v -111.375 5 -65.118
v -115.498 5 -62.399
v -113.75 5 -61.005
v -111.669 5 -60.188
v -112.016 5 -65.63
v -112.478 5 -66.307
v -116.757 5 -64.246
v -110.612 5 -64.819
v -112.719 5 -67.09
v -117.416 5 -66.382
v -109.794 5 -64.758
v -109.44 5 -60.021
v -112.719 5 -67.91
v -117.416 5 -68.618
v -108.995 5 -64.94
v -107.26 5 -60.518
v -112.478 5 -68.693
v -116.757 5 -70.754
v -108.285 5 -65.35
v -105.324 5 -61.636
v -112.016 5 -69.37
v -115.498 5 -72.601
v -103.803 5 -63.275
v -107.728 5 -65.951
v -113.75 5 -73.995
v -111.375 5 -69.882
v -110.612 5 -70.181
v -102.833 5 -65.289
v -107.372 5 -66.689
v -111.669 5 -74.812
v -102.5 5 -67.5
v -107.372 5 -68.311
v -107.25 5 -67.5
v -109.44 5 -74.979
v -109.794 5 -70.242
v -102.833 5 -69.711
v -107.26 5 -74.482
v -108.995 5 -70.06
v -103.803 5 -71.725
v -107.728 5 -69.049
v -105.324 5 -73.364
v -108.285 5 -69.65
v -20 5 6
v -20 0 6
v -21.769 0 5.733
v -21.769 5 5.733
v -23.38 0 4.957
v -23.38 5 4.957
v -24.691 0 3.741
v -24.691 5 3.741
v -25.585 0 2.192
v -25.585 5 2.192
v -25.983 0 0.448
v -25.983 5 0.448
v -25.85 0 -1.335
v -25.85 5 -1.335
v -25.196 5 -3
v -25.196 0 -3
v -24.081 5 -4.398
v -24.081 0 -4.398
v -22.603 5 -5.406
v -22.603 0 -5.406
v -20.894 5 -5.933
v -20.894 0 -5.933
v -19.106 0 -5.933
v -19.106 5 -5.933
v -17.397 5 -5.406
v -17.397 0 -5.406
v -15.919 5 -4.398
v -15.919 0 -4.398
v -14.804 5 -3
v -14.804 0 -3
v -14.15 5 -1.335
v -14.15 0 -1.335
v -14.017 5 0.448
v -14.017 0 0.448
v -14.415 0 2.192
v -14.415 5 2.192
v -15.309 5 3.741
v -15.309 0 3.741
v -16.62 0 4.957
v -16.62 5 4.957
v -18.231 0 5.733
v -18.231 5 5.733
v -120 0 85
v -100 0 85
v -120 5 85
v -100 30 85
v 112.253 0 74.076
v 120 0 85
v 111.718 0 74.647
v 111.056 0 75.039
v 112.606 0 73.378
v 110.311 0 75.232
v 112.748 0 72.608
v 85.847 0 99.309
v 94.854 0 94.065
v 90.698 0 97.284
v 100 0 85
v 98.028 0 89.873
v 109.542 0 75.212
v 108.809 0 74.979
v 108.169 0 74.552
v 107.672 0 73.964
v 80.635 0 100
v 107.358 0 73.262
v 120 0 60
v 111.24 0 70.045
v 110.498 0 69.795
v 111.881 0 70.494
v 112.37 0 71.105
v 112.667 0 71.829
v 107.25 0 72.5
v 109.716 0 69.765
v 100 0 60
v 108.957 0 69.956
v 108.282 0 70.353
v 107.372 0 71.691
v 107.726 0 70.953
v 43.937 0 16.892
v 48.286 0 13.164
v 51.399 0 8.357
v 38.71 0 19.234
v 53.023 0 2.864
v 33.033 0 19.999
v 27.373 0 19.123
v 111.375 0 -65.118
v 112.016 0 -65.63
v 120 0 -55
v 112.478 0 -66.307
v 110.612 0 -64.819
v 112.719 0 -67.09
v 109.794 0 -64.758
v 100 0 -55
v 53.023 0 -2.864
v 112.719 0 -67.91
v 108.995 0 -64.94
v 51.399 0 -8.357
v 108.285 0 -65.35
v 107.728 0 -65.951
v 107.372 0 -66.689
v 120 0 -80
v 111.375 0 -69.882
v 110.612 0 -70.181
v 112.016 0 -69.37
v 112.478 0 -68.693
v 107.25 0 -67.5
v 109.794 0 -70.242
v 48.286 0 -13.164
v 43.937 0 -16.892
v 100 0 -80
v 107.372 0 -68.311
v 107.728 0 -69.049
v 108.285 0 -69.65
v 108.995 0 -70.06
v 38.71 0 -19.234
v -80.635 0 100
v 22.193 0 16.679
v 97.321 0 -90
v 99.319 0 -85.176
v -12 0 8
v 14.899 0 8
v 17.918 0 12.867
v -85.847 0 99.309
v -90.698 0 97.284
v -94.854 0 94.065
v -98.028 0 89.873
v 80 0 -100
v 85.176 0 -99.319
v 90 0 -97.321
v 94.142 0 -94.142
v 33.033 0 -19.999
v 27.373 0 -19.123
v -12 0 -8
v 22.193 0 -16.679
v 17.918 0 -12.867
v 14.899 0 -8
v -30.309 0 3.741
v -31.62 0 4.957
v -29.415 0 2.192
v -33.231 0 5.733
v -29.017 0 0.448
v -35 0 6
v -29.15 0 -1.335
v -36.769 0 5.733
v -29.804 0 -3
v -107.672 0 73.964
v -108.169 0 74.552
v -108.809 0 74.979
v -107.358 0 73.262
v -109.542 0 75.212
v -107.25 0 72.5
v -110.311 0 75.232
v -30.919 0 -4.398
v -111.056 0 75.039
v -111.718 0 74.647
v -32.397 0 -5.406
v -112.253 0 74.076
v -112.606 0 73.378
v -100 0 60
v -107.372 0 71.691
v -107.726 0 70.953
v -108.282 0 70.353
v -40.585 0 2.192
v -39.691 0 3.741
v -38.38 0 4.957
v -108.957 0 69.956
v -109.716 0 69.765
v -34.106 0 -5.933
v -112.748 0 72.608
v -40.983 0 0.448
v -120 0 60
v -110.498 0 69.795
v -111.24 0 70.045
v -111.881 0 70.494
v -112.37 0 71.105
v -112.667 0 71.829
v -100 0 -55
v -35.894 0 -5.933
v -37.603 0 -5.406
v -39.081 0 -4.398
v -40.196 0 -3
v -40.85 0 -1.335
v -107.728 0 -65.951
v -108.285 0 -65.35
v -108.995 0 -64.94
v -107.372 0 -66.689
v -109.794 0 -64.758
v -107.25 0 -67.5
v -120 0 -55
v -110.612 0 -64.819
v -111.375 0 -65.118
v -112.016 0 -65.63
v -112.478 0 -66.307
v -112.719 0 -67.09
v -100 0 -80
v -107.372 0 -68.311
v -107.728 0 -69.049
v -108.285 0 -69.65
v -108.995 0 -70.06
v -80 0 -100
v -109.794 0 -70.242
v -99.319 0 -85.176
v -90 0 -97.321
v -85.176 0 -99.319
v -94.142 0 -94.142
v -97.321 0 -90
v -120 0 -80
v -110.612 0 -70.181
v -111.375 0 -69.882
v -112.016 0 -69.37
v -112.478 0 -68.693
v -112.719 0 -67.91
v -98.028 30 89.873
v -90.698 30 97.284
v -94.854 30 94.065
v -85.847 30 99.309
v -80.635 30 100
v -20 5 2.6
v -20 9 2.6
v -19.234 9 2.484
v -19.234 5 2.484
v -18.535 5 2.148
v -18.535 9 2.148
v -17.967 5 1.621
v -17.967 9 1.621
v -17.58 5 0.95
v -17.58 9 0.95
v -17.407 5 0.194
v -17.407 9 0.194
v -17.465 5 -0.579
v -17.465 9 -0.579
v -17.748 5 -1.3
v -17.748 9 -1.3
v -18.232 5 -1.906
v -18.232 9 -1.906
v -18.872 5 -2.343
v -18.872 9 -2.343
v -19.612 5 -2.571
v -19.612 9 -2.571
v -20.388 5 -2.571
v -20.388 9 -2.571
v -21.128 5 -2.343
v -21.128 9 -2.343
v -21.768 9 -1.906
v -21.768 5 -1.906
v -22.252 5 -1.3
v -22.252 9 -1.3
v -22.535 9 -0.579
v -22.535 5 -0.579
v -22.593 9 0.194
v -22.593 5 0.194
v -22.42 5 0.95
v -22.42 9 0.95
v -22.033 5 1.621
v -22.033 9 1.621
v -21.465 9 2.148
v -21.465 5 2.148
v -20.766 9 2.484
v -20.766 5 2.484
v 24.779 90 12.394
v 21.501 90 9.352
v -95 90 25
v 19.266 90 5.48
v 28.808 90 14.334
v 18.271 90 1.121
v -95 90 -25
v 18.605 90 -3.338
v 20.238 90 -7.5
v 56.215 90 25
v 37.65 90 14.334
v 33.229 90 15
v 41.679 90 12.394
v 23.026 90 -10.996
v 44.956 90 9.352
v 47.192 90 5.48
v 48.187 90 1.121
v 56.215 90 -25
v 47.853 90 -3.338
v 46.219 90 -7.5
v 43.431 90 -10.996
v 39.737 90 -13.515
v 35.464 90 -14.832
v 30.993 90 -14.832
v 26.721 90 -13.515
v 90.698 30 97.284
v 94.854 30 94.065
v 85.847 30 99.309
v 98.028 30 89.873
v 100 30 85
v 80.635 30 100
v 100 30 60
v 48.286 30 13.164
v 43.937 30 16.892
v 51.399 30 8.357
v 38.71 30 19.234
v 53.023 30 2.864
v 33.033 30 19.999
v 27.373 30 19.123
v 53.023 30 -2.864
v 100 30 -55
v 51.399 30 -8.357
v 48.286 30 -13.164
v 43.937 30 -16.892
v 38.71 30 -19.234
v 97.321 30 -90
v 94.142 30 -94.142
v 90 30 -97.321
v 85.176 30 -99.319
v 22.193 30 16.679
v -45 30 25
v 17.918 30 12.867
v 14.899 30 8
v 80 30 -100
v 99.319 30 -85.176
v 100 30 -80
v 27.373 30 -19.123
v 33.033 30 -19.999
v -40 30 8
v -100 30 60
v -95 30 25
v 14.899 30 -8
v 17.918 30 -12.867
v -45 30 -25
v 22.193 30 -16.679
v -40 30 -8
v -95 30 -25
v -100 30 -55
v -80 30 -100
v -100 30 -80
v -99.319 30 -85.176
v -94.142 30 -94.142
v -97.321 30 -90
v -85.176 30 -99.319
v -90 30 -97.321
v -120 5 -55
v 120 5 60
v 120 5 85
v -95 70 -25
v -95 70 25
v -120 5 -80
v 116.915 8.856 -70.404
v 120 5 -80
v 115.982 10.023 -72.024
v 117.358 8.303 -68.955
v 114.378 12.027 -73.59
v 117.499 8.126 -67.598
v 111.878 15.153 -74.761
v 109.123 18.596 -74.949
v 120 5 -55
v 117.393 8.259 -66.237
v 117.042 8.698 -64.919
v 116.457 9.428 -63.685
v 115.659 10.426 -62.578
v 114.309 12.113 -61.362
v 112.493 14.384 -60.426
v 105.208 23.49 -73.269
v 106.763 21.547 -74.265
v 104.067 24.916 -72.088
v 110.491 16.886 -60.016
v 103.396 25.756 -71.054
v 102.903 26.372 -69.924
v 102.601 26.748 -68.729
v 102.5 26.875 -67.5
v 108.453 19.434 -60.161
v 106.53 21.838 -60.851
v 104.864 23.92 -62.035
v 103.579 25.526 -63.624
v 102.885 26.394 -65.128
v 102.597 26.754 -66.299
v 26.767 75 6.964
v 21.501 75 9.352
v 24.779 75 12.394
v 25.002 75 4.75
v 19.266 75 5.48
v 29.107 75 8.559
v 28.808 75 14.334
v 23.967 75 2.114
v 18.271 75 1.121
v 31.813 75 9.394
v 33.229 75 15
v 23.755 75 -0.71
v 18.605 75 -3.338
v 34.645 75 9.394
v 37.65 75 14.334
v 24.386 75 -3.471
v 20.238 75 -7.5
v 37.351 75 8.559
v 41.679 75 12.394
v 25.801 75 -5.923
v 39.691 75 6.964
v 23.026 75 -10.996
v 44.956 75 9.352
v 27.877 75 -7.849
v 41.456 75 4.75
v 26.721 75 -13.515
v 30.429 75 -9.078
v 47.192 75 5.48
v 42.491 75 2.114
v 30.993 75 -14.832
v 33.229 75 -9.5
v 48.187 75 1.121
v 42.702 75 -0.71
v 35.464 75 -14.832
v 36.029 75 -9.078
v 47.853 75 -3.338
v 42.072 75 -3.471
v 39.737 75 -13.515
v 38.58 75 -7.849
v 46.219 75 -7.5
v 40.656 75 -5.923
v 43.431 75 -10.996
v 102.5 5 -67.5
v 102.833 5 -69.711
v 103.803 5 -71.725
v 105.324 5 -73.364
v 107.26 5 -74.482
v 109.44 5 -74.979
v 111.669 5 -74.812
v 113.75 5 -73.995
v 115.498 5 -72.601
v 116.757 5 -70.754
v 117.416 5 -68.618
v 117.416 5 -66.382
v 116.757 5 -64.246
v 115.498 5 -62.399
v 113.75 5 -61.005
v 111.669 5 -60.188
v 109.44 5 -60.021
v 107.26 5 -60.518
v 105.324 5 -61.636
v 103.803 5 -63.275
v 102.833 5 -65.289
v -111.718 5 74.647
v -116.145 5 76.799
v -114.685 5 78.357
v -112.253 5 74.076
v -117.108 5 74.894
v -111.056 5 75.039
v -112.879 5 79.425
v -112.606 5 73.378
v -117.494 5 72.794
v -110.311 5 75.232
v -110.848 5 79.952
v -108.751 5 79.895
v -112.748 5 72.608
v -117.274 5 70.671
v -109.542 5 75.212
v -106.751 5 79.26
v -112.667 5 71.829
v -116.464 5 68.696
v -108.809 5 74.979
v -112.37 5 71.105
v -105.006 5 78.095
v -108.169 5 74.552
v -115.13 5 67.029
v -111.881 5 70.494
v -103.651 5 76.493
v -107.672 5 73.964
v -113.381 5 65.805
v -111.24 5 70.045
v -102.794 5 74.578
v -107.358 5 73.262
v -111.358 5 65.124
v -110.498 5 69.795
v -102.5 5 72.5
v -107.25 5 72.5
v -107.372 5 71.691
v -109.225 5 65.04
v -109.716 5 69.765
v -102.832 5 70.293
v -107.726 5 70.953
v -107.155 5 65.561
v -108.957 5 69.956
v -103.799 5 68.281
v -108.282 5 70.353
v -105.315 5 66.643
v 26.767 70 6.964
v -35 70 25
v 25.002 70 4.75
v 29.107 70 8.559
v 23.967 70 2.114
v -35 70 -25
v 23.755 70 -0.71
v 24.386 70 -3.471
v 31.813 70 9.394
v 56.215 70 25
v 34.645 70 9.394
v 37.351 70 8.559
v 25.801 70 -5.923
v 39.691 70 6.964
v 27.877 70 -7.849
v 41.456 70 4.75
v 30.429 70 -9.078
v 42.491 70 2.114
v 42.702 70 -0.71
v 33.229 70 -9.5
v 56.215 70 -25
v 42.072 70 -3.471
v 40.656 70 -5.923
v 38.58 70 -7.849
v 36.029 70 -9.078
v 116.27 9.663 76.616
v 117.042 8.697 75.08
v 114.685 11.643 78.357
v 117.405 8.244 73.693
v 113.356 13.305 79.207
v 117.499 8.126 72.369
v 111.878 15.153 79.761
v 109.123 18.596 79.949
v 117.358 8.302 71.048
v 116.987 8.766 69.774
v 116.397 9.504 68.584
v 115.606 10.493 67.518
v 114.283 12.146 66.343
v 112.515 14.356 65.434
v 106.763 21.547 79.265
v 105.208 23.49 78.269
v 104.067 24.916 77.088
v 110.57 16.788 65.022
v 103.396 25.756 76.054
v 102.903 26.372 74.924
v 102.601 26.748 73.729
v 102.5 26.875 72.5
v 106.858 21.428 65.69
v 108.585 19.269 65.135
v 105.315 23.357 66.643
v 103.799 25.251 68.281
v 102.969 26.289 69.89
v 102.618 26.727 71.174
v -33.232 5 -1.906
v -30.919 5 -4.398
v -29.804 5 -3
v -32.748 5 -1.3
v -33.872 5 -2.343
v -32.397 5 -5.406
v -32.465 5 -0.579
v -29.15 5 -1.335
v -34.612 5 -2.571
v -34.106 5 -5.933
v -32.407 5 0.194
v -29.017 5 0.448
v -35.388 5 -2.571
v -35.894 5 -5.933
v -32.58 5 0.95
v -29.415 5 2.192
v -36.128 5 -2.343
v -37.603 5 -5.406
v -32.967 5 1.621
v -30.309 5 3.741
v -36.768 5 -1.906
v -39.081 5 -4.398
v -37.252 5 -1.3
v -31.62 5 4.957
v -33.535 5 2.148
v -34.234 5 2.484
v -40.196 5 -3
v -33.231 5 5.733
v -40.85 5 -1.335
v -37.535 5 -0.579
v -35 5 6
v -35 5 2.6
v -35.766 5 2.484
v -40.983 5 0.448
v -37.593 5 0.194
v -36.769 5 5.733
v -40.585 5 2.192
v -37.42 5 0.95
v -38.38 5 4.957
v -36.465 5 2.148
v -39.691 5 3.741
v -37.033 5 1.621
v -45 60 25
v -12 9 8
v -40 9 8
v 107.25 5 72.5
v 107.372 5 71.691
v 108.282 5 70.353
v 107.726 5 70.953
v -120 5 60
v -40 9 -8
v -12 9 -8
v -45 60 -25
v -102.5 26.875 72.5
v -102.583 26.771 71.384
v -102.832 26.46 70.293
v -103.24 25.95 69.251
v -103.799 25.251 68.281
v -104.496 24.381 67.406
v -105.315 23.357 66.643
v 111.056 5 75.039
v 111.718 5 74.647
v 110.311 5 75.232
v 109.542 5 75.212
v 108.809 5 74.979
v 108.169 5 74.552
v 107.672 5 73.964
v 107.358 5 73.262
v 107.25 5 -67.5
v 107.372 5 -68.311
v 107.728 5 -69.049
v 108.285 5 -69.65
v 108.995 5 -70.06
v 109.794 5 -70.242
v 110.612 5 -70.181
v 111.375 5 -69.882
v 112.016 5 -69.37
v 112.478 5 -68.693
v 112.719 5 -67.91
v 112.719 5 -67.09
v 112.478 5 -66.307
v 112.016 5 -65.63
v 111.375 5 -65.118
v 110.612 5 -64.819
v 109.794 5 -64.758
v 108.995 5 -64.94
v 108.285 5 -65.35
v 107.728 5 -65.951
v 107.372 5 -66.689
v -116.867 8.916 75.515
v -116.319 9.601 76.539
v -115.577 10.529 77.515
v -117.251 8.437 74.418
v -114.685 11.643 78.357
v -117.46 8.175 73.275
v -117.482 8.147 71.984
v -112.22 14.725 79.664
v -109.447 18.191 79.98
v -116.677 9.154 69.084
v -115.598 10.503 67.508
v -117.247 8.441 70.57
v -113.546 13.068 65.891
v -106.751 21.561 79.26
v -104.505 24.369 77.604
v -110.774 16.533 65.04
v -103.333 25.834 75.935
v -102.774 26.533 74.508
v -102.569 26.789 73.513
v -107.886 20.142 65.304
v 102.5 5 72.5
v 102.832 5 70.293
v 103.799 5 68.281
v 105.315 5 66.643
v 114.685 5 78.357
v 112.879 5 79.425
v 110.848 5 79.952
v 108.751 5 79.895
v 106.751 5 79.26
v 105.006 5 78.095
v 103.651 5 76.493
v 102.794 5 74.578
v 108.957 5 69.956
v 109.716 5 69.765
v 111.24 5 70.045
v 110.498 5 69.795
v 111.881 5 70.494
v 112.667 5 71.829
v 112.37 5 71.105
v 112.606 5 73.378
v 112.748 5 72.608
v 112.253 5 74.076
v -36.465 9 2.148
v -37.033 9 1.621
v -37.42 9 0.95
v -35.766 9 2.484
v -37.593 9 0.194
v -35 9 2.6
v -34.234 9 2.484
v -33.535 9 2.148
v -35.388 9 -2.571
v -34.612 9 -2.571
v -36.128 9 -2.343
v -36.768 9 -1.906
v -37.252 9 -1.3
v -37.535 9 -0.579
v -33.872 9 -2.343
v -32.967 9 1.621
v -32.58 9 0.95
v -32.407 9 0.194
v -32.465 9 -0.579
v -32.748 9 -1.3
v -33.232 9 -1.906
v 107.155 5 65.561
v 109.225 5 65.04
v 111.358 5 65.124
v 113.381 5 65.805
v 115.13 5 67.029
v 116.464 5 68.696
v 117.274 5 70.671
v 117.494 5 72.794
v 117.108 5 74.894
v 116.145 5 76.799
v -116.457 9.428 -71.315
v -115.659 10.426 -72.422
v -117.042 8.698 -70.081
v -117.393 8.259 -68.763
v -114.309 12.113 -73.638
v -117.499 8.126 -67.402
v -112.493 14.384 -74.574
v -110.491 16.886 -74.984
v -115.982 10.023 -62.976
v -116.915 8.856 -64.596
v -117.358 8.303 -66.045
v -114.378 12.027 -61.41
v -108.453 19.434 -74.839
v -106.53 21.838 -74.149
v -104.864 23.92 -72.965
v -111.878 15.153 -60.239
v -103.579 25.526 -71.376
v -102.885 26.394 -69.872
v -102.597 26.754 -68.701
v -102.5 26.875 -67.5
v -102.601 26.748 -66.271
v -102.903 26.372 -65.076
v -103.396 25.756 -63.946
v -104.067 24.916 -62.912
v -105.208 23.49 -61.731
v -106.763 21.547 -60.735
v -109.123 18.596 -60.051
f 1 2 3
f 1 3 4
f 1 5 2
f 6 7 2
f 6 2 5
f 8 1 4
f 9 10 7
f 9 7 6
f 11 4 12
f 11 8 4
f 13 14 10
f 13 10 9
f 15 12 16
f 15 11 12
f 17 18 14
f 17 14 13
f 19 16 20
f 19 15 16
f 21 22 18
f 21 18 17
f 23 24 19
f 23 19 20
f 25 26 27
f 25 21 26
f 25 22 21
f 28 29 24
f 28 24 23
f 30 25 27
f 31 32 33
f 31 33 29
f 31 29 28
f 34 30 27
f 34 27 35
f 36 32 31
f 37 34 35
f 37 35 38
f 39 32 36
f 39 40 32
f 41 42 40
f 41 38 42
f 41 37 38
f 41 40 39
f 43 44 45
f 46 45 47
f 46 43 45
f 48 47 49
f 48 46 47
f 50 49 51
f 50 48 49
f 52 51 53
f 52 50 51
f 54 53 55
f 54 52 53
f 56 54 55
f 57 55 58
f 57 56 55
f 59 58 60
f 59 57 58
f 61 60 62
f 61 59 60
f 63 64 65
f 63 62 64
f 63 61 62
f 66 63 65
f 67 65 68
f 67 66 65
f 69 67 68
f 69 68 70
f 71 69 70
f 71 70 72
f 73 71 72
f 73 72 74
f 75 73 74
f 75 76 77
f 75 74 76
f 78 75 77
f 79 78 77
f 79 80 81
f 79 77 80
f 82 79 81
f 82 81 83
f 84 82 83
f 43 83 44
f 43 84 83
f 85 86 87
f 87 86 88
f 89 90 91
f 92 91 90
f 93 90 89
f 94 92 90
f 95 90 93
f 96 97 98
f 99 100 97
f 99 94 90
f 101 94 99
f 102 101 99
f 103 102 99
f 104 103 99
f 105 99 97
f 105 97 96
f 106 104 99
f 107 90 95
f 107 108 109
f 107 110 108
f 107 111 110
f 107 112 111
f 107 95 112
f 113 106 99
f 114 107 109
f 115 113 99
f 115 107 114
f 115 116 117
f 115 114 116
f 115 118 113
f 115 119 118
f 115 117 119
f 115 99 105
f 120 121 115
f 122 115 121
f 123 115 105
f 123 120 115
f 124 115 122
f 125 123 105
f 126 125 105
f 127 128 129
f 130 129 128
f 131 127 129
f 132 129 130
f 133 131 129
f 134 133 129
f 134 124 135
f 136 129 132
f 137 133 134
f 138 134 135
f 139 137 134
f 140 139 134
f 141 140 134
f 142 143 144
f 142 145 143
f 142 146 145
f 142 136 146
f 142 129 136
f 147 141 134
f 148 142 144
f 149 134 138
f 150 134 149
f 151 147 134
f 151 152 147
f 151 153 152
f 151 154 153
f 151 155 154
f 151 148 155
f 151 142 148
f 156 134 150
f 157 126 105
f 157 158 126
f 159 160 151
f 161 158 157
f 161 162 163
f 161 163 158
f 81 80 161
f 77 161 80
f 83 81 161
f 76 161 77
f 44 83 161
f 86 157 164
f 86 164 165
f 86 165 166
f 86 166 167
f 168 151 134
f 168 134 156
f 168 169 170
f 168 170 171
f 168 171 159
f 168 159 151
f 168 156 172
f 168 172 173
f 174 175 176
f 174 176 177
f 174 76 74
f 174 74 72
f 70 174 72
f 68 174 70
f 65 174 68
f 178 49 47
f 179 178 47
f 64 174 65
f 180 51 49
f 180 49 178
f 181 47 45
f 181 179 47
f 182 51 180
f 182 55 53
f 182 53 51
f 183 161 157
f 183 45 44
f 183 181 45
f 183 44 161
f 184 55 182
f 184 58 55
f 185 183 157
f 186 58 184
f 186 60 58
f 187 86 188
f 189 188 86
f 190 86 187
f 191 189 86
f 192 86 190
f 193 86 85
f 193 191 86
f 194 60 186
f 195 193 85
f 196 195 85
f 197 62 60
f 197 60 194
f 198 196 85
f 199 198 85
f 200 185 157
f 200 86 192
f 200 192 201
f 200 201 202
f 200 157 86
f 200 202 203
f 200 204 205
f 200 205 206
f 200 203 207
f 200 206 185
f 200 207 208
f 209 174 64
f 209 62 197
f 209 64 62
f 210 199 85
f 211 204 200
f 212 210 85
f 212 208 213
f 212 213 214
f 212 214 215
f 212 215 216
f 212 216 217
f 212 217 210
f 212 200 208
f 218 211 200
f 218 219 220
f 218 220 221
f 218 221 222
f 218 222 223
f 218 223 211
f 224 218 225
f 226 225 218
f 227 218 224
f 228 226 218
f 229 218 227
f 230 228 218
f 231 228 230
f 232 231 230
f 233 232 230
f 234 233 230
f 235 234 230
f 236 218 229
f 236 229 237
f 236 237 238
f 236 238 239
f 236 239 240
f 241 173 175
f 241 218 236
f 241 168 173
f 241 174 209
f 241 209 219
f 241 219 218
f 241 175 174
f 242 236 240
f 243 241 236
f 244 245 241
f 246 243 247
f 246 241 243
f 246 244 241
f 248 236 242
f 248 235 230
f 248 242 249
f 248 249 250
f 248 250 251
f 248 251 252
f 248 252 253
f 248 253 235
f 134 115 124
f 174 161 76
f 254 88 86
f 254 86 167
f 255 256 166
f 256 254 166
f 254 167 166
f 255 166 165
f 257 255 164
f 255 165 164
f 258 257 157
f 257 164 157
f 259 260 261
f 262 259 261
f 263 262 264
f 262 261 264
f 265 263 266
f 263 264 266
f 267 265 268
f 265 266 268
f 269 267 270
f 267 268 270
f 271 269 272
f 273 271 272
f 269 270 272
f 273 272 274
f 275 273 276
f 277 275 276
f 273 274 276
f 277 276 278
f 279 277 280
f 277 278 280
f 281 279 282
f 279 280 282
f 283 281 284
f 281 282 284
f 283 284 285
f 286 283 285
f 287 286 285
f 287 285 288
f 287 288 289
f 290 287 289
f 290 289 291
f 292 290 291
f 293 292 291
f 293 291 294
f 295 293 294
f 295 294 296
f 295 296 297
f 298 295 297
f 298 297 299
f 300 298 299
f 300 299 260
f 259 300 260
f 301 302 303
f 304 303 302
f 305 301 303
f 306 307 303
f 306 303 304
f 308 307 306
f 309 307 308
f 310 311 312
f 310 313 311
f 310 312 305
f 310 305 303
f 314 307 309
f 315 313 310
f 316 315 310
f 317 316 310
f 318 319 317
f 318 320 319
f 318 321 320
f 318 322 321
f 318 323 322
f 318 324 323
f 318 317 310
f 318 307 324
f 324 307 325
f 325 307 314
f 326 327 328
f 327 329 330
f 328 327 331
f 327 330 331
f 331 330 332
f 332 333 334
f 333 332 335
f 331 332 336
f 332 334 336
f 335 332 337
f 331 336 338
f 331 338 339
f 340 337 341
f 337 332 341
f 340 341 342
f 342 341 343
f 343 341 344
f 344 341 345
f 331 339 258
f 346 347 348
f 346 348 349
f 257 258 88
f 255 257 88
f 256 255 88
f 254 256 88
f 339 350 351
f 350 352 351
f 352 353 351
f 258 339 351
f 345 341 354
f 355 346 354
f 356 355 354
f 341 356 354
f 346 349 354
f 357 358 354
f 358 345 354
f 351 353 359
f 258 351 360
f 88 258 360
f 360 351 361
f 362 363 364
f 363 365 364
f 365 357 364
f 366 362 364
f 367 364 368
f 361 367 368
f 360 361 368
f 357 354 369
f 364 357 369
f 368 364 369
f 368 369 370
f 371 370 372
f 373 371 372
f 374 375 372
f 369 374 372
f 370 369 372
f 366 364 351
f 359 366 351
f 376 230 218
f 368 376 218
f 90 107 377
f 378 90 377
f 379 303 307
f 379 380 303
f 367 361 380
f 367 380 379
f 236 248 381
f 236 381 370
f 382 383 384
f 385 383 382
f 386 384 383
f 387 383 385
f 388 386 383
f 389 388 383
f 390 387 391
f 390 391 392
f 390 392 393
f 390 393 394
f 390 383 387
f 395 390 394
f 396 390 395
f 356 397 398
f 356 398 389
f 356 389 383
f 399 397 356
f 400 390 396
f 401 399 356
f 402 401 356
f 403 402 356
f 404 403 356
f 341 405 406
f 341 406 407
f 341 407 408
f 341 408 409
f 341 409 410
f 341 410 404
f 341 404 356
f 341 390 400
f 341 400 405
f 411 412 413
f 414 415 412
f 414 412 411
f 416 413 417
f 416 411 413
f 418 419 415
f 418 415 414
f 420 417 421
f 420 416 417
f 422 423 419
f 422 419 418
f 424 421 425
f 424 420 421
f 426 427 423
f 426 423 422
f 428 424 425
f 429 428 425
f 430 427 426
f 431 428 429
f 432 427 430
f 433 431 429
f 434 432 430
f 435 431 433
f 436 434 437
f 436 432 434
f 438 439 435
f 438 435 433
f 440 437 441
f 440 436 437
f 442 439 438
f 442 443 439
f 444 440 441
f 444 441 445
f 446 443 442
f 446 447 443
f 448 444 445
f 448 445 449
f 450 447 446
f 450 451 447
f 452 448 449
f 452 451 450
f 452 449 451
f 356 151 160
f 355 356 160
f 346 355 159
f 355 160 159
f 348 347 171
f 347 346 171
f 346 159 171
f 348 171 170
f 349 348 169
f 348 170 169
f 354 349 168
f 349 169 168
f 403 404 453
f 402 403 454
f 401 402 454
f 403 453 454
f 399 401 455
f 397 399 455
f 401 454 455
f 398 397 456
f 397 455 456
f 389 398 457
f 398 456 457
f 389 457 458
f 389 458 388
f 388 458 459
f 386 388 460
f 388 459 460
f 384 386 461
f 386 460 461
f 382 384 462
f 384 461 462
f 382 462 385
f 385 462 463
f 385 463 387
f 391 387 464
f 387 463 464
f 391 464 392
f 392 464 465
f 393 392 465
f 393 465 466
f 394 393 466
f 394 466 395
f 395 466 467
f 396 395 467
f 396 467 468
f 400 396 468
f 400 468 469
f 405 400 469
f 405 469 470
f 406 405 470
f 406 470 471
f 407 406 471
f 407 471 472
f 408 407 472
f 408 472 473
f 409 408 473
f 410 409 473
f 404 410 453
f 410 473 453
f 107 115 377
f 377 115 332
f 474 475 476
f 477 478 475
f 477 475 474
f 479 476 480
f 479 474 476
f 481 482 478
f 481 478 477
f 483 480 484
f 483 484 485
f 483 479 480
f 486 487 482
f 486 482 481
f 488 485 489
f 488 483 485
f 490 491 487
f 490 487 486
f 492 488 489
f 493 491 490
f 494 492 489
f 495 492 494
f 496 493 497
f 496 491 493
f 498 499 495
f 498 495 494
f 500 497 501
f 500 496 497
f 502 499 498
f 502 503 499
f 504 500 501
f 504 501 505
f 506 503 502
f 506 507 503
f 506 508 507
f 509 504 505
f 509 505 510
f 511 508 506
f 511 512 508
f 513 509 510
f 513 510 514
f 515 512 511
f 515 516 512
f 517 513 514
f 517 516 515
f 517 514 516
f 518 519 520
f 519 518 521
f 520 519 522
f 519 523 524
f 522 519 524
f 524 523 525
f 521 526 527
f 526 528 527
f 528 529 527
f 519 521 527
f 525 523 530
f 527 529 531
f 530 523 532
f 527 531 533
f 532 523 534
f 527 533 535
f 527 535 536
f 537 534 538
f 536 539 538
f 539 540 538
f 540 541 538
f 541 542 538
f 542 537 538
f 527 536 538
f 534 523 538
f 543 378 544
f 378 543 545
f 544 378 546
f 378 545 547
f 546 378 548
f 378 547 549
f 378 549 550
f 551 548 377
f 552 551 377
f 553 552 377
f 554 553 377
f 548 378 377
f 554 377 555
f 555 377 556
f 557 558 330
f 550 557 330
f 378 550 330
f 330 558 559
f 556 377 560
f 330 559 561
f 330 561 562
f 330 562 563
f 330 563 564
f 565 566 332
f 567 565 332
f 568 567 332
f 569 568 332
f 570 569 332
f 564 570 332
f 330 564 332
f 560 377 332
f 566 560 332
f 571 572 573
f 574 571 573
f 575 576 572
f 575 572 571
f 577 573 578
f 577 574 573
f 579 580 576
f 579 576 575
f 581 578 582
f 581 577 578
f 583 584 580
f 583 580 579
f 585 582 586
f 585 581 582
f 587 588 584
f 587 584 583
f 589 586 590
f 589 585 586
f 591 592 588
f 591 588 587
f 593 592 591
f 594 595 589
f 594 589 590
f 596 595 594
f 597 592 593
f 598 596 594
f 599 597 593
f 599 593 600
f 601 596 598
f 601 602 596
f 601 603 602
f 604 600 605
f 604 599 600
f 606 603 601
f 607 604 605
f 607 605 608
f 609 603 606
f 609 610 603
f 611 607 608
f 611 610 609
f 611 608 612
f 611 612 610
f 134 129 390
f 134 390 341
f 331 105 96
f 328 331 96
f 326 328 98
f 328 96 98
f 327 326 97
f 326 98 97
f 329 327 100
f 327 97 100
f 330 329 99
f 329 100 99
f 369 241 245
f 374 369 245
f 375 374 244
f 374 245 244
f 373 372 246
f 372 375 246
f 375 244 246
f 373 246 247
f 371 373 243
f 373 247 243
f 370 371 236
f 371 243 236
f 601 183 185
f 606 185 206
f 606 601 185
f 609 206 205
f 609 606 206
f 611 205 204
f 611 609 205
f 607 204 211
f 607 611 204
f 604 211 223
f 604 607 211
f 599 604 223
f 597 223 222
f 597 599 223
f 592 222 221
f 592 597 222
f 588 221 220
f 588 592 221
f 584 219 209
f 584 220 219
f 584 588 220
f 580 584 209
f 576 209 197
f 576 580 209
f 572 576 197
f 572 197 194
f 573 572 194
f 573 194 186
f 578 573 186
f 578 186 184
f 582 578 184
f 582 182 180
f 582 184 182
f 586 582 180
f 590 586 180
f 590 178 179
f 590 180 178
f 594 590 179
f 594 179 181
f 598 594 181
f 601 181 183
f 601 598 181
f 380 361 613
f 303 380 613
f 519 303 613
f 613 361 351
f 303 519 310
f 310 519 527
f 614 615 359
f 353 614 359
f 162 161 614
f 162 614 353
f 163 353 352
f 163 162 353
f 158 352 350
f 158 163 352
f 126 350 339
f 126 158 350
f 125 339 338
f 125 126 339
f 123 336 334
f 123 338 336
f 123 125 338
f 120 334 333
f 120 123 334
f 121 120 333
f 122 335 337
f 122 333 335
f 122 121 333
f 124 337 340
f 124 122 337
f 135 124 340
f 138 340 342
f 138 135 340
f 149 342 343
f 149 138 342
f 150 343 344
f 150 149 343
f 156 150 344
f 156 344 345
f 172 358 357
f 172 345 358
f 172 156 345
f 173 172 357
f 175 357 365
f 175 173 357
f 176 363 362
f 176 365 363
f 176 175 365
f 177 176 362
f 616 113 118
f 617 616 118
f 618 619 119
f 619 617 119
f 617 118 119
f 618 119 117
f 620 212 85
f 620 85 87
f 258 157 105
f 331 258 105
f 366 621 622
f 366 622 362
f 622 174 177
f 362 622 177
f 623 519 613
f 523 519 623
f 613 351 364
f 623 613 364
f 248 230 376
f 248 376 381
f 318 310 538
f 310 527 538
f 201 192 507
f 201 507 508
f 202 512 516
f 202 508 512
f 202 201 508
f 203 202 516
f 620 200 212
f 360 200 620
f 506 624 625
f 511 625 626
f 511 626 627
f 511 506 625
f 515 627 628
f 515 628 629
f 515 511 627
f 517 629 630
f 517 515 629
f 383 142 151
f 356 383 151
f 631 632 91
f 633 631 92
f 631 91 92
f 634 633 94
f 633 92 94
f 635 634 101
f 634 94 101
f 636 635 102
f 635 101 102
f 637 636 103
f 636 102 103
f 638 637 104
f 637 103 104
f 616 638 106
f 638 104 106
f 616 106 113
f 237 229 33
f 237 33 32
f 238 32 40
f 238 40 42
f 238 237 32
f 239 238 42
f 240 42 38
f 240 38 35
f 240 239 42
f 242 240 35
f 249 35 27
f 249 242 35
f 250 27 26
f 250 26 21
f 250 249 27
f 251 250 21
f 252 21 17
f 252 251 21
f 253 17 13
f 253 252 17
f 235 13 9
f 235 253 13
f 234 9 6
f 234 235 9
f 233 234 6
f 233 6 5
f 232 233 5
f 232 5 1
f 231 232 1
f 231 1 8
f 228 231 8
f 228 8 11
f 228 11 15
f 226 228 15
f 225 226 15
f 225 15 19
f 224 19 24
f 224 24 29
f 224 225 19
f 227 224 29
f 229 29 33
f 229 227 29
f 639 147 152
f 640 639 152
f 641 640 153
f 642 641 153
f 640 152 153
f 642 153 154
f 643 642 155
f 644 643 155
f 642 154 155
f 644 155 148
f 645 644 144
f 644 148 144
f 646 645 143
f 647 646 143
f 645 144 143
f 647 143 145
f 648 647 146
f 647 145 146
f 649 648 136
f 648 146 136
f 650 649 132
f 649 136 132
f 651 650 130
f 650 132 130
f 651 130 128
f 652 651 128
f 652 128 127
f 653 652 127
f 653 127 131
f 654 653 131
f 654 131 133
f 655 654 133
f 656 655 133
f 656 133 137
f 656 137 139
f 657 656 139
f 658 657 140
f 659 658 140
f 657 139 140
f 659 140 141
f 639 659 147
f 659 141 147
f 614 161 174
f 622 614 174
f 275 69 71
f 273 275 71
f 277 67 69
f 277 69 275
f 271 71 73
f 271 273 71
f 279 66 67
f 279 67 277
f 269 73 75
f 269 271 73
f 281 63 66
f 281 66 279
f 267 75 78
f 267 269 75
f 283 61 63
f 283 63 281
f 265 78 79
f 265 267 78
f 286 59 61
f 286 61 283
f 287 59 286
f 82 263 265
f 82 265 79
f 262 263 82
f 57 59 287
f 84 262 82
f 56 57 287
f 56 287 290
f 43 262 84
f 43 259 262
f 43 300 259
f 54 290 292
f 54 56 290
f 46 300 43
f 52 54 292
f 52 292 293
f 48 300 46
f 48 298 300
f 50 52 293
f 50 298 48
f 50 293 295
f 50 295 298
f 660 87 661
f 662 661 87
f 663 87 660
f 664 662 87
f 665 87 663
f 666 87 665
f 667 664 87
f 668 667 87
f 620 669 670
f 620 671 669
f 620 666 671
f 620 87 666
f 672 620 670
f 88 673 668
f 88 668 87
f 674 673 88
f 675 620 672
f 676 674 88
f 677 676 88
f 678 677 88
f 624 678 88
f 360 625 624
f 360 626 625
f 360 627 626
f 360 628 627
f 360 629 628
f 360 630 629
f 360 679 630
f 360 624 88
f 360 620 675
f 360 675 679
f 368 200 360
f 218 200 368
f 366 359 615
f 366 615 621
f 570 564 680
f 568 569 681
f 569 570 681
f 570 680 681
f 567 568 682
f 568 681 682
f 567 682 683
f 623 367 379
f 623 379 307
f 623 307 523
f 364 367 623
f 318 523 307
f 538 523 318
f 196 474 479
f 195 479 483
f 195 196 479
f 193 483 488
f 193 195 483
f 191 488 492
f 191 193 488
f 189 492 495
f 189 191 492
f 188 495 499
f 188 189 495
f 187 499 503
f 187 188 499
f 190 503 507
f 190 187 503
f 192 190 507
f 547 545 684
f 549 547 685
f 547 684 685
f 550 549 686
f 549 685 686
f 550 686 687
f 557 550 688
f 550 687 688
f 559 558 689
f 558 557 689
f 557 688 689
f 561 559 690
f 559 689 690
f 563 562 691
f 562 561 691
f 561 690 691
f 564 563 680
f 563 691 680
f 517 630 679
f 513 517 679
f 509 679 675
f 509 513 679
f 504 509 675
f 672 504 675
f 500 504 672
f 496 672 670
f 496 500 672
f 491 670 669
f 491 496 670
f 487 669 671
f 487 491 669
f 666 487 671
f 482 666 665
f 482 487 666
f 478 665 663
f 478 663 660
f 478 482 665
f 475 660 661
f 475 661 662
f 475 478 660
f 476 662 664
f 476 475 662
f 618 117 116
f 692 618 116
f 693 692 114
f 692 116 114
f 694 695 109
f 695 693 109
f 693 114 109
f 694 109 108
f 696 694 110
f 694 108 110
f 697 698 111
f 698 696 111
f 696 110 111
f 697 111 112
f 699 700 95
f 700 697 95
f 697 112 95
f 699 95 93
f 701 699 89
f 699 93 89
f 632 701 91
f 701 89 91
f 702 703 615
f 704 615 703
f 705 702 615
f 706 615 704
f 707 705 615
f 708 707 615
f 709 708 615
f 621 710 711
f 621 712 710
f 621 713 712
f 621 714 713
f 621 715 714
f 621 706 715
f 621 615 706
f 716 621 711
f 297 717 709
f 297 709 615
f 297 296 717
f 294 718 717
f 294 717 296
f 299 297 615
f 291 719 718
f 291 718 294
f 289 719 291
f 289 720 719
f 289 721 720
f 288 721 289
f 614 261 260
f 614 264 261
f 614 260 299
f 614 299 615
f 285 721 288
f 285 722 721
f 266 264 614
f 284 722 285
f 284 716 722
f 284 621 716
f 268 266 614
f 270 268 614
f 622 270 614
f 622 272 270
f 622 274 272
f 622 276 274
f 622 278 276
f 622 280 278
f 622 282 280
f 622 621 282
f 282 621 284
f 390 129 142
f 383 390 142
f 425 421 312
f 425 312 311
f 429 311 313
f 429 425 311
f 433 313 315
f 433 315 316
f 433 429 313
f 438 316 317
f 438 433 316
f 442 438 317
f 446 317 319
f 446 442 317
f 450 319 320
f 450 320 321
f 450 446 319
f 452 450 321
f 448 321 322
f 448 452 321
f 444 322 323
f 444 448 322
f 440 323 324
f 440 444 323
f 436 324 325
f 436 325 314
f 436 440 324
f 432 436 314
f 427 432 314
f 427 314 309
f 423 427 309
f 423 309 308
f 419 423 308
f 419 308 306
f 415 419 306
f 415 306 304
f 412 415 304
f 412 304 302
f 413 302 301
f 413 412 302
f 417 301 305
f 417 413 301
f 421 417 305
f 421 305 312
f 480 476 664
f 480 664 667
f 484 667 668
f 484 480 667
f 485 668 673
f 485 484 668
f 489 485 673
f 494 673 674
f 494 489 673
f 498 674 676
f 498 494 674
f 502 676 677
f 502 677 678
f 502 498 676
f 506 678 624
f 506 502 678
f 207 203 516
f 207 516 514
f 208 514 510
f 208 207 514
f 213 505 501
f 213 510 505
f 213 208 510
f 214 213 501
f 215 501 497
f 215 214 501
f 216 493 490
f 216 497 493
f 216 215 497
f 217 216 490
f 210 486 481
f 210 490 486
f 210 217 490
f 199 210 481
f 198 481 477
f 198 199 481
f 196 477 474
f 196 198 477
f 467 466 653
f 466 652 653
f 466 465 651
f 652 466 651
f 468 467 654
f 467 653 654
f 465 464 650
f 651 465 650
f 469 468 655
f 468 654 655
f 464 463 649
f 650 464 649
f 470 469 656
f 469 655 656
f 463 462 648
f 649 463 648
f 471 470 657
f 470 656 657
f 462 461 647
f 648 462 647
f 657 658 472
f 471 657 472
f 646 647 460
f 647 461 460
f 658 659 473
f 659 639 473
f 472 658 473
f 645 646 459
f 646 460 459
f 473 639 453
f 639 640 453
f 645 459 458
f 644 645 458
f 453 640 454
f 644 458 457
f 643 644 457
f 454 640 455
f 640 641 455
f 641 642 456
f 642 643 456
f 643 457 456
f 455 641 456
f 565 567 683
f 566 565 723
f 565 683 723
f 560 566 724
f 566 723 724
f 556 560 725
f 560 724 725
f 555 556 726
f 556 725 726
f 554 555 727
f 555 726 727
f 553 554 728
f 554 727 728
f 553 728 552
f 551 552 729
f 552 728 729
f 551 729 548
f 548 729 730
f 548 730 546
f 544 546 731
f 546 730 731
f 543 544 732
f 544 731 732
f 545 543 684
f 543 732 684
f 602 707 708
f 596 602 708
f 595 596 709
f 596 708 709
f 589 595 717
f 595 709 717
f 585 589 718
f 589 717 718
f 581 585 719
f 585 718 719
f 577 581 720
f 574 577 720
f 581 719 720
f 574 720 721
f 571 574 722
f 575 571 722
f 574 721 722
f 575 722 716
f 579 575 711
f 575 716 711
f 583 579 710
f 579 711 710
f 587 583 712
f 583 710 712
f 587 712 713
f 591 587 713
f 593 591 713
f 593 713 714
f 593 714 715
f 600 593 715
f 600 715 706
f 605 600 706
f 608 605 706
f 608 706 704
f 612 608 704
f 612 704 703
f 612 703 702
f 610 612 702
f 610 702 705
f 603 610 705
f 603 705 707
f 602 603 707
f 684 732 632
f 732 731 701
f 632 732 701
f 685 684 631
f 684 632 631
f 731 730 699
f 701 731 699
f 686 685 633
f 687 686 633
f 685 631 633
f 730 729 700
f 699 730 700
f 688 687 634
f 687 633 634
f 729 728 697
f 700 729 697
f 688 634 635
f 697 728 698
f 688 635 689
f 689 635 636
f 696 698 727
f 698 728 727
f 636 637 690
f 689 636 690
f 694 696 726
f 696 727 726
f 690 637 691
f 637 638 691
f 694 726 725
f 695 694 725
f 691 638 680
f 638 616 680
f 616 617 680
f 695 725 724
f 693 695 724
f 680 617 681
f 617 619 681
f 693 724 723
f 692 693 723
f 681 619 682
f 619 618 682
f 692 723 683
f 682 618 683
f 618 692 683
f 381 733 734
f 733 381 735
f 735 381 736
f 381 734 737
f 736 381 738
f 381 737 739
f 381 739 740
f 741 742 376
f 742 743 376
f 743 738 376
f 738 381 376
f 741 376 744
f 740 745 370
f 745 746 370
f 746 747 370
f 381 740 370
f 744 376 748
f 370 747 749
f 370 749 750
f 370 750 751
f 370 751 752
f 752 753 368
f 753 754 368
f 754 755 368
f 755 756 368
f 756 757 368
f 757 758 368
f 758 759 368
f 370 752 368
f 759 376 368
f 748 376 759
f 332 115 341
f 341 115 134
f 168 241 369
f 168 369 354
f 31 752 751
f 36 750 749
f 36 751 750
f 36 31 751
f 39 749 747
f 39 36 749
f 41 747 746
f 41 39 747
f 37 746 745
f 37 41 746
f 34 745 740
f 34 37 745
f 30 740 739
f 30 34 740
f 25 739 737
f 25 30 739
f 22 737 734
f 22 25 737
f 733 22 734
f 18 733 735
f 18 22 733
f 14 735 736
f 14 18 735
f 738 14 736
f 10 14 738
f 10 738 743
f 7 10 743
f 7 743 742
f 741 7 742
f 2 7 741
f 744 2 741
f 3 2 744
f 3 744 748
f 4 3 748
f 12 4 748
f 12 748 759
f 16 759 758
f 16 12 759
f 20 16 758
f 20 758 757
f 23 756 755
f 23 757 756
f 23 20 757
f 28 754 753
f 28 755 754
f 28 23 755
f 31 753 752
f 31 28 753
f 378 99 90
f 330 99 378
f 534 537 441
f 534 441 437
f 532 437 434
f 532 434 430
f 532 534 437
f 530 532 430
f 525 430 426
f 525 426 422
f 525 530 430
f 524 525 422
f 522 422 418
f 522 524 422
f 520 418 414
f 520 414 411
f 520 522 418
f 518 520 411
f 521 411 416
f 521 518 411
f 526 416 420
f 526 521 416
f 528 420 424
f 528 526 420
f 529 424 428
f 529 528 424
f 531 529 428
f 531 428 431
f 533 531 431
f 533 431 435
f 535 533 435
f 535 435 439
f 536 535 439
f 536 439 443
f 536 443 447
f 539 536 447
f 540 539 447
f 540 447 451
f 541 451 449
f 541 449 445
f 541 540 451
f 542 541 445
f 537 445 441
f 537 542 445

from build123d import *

# Parameters (mm, degrees)
SZKIC1_W                        = 200
SZKIC1_H                        = 200
DODANIE_WYCI_GNI_CIE1_DEPTH     = 30
WYTNIJ_WYCI_GNI_CIE1_DEPTH      = 145.568322948
WYTNIJ_WYCI_GNI_CIE1_DEPTH_BACK = 145.568322948
SZKIC2_W                        = 80
SZKIC2_H                        = 16
WYTNIJ_WYCI_GNI_CIE2_DEPTH      = 145.568322948
WYTNIJ_WYCI_GNI_CIE2_DEPTH_BACK = 145.568322948
SZKIC3_R                        = 20
SZKIC4_W                        = 28
SZKIC4_H                        = 16
DODANIE_WYCI_GNI_CIE2_DEPTH     = 9
DODANIE_WYCI_GNI_CIE3_START     = 30
SZKIC5_W                        = 50
SZKIC5_H                        = 50
DODANIE_WYCI_GNI_CIE3_DEPTH     = 40
DODANIE_WYCI_GNI_CIE4_START     = 70
SZKIC6_W                        = 151.215135745
SZKIC6_H                        = 50
SZKIC6_R                        = 9.5
DODANIE_WYCI_GNI_CIE4_DEPTH     = 5
DODANIE_WYCI_GNI_CIE5_START     = 75
SZKIC7_W                        = 151.215135745
SZKIC7_H                        = 50
SZKIC7_R                        = 15
DODANIE_WYCI_GNI_CIE5_DEPTH     = 15
DODANIE_WYCI_GNI_CIE6_START     = 60
DODANIE_WYCI_GNI_CIE6_DEPTH     = 25
WYTNIJ_WYCI_GNI_CIE3_DEPTH      = 181.277563773
WYTNIJ_WYCI_GNI_CIE4_START      = 5
WYTNIJ_WYCI_GNI_CIE4_DEPTH      = 176.277563773
SZYK_LINIOWY1_OUTLINE_R         = 7.5
SZYK_LINIOWY1_OUTLINE_R_2       = 2.75
SZYK_LINIOWY1_DEPTH             = 5
SZYK_LINIOWY1_2_OUTLINE_W       = 20
SZYK_LINIOWY1_2_OUTLINE_H       = 25
SZYK_LINIOWY1_2_OUTLINE_R       = 7.5
SZYK_LINIOWY1_2_DEPTH           = 30
SZYK_START                      = -113
SZYK_LINIOWY1_3_OUTLINE_W       = 35
SZYK_LINIOWY1_3_OUTLINE_H       = 25
SZYK_LINIOWY1_3_DEPTH           = 16.172267629
ZAOKR_GLENIE1_R                 = 20
SFAZOWANIE1_SIZE                = 10
SZKIC10_R                       = 2.6
WYTNIJ_WYCI_GNI_CIE5_DEPTH      = 176.957381204
WYTNIJ_WYCI_GNI_CIE6_DEPTH      = 181.277563773
WYTNIJ_WYCI_GNI_CIE6_DEPTH_BACK = 5
SZKIC11_R                       = 6


with BuildPart() as part:
    # Szkic1 → Dodanie-wyciągnięcie1 (new body)
    with BuildSketch(Plane(origin=(0, 0, 0), x_dir=(1, 0, 0), z_dir=(0, 1, 0))):
        Rectangle(SZKIC1_W, SZKIC1_H)
    extrude(amount=DODANIE_WYCI_GNI_CIE1_DEPTH)

    # Szkic2 → Wytnij-wyciągnięcie1 (cut, two sides: drawn at the far end of the back side and taken through both)
    with BuildSketch(Plane(origin=(0, 0, 0), x_dir=(1, 0, 0), z_dir=(0, 1, 0)).offset(-WYTNIJ_WYCI_GNI_CIE1_DEPTH_BACK)):
        Rectangle(SZKIC2_W, SZKIC2_H)
    extrude(amount=WYTNIJ_WYCI_GNI_CIE1_DEPTH + WYTNIJ_WYCI_GNI_CIE1_DEPTH_BACK, mode=Mode.SUBTRACT)

    # Szkic3 → Wytnij-wyciągnięcie2 (cut, two sides: drawn at the far end of the back side and taken through both)
    with BuildSketch(Plane(origin=(0, 0, 0), x_dir=(1, 0, 0), z_dir=(0, 1, 0)).offset(-WYTNIJ_WYCI_GNI_CIE2_DEPTH_BACK)):
        with Locations((33.228865647, 0)):
            Circle(SZKIC3_R)
    extrude(amount=WYTNIJ_WYCI_GNI_CIE2_DEPTH + WYTNIJ_WYCI_GNI_CIE2_DEPTH_BACK, mode=Mode.SUBTRACT)

    # Szkic4 → Dodanie-wyciągnięcie2 (add)
    with BuildSketch(Plane(origin=(0, 0, 0), x_dir=(1, 0, 0), z_dir=(0, 1, 0))):
        with Locations((-26, 0)):
            Rectangle(SZKIC4_W, SZKIC4_H)
    extrude(amount=DODANIE_WYCI_GNI_CIE2_DEPTH)

    # Szkic5 → Dodanie-wyciągnięcie3 (add)
    with BuildSketch(Plane(origin=(0, 0, 0), x_dir=(1, 0, 0), z_dir=(0, 1, 0)).offset(DODANIE_WYCI_GNI_CIE3_START)):
        with Locations((-70, 0)):
            Rectangle(SZKIC5_W, SZKIC5_H)
    extrude(amount=DODANIE_WYCI_GNI_CIE3_DEPTH)

    # Szkic6 → Dodanie-wyciągnięcie4 (add)
    with BuildSketch(Plane(origin=(0, 0, 0), x_dir=(1, 0, 0), z_dir=(0, 1, 0)).offset(DODANIE_WYCI_GNI_CIE4_START)):
        with Locations((-19.392432127, 0)):
            Rectangle(SZKIC6_W, SZKIC6_H)
        with Locations(Location((33.228865647, 0, 0), (0, 0, 90))):
            Circle(SZKIC6_R, mode=Mode.SUBTRACT)
    extrude(amount=DODANIE_WYCI_GNI_CIE4_DEPTH)

    # Szkic7 → Dodanie-wyciągnięcie5 (add)
    with BuildSketch(Plane(origin=(0, 0, 0), x_dir=(1, 0, 0), z_dir=(0, 1, 0)).offset(DODANIE_WYCI_GNI_CIE5_START)):
        with Locations((-19.392432127, 0)):
            Rectangle(SZKIC7_W, SZKIC7_H)
        with Locations(Location((33.228865647, 0, 0), (0, 0, 270))):
            Circle(SZKIC7_R, mode=Mode.SUBTRACT)
    extrude(amount=DODANIE_WYCI_GNI_CIE5_DEPTH)

    # Szkic8 → Dodanie-wyciągnięcie6 (add)
    with BuildSketch(Plane.XY.offset(DODANIE_WYCI_GNI_CIE6_START)):
        Polygon((-100, 0), (-120, 0), (-120, 5), (-100, 30), align=None)
    dodanie_wyci_gni_cie6 = extrude(amount=DODANIE_WYCI_GNI_CIE6_DEPTH)

    # Szkic9 → Wytnij-wyciągnięcie3 (cut, symmetric)
    with BuildSketch(Plane(origin=(0, 0, 0), x_dir=(1, 0, 0), z_dir=(0, 1, 0))):
        with BuildLine():
            ThreePointArc((-107.25, -72.5), (-107.5214161, -71.308730991), (-108.282088619, -70.352610774))
            Line((-108.282088619, -70.352610774), (-111.717911381, -74.647389226))
            ThreePointArc((-111.717911381, -74.647389226), (-108.808730991, -74.9785839), (-107.25, -72.5))
        make_face()
        with BuildLine():
            Line((-111.717911381, -74.647389226), (-108.282088619, -70.352610774))
            ThreePointArc((-108.282088619, -70.352610774), (-112.147389226, -70.782088619), (-111.717911381, -74.647389226))
        make_face()
    wytnij_wyci_gni_cie3 = extrude(amount=WYTNIJ_WYCI_GNI_CIE3_DEPTH, both=True, mode=Mode.SUBTRACT)

    # Szkic9<3> → Wytnij-wyciągnięcie4 (cut, through all)
    with BuildSketch(Plane(origin=(0, 0, 0), x_dir=(1, 0, 0), z_dir=(0, 1, 0)).offset(WYTNIJ_WYCI_GNI_CIE4_START)):
        with BuildLine():
            ThreePointArc((-102.5, -72.5), (-103.240225728, -69.251084521), (-105.314787143, -66.643483929))
            Line((-105.314787143, -66.643483929), (-108.282088619, -70.352610774))
            ThreePointArc((-108.282088619, -70.352610774), (-107.5214161, -71.308730991), (-107.25, -72.5))
            ThreePointArc((-107.25, -72.5), (-108.808730991, -74.9785839), (-111.717911381, -74.647389226))
            Line((-111.717911381, -74.647389226), (-114.685212857, -78.356516071))
            ThreePointArc((-114.685212857, -78.356516071), (-106.751084521, -79.259774272), (-102.5, -72.5))
        make_face()
        with BuildLine():
            Line((-108.282088619, -70.352610774), (-105.314787143, -66.643483929))
            ThreePointArc((-105.314787143, -66.643483929), (-115.856516071, -67.814787143), (-114.685212857, -78.356516071))
            Line((-114.685212857, -78.356516071), (-111.717911381, -74.647389226))
            ThreePointArc((-111.717911381, -74.647389226), (-112.147389226, -70.782088619), (-108.282088619, -70.352610774))
        make_face()
    wytnij_wyci_gni_cie4 = extrude(amount=WYTNIJ_WYCI_GNI_CIE4_DEPTH, mode=Mode.SUBTRACT)



with BuildPart() as body_2:
    # Szyk liniowy1: read off the stored shape, not the designer's step
    # Szyk liniowy1 outline → Szyk liniowy1 (new body)
    with BuildSketch(Plane(origin=(0, 0, 0), x_dir=(1, 0, 0), z_dir=(0, 1, 0))):
        with Locations((-110, 67.5)):
            Circle(SZYK_LINIOWY1_OUTLINE_R)
        with Locations((-110, 67.5)):
            Circle(SZYK_LINIOWY1_OUTLINE_R_2, mode=Mode.SUBTRACT)
    szyk_liniowy1 = extrude(amount=SZYK_LINIOWY1_DEPTH)


with BuildPart() as part_1:
    add(part.part)

    add(body_2.part)  # Szyk liniowy1 2 merges body 2
    # Szyk liniowy1 2 outline → Szyk liniowy1 2 (add)
    with BuildSketch(Plane(origin=(0, 0, 0), x_dir=(1, 0, 0), z_dir=(0, 1, 0))):
        with Locations((-110, 67.5)):
            Rectangle(SZYK_LINIOWY1_2_OUTLINE_W, SZYK_LINIOWY1_2_OUTLINE_H)
        with Locations((-110, 67.5)):
            Circle(SZYK_LINIOWY1_2_OUTLINE_R, mode=Mode.SUBTRACT)
    szyk_liniowy1_2 = extrude(amount=SZYK_LINIOWY1_2_DEPTH)

    # Szyk liniowy1 3 outline → Szyk liniowy1 3 (cut)
    with BuildSketch(Plane(origin=(0, 0, 0), x_dir=(0.6246950475544242, 0.7808688094430304, 0), z_dir=(0.7808688094430304, -0.6246950475544242, 0)).offset(SZYK_START)):
        with Locations((-55.5, -67.5)):
            Rectangle(SZYK_LINIOWY1_3_OUTLINE_W, SZYK_LINIOWY1_3_OUTLINE_H)
    szyk_liniowy1_3 = extrude(amount=SZYK_LINIOWY1_3_DEPTH, mode=Mode.SUBTRACT)

    # Lustro1: Dodanie-wyciągnięcie6, Wytnij-wyciągnięcie3, Wytnij-wyciągnięcie4, Szyk liniowy1, Szyk liniowy1 2, Szyk liniowy1 3 across plane
    add(dodanie_wyci_gni_cie6.mirror(Plane(origin=(0, 0, 0), x_dir=(0, 0, 1), z_dir=(1, 0, 0))))
    add(wytnij_wyci_gni_cie3.mirror(Plane(origin=(0, 0, 0), x_dir=(0, 0, 1), z_dir=(1, 0, 0))), mode=Mode.SUBTRACT)
    add(wytnij_wyci_gni_cie4.mirror(Plane(origin=(0, 0, 0), x_dir=(0, 0, 1), z_dir=(1, 0, 0))), mode=Mode.SUBTRACT)
    add(szyk_liniowy1.mirror(Plane(origin=(0, 0, 0), x_dir=(0, 0, 1), z_dir=(1, 0, 0))))
    add(szyk_liniowy1_2.mirror(Plane(origin=(0, 0, 0), x_dir=(0, 0, 1), z_dir=(1, 0, 0))))
    add(szyk_liniowy1_3.mirror(Plane(origin=(0, 0, 0), x_dir=(0, 0, 1), z_dir=(1, 0, 0))), mode=Mode.SUBTRACT)

    # Zaokrąglenie1
    # the kernel refuses this fillet: 20 mm, written as the material it takes off along each edge
    with BuildSketch(Plane(origin=(-100, -48.412291828, 100), x_dir=(1, 0, 0), z_dir=(0, 1, 0))) as zaokr_glenie1_piece_1:
        with BuildLine():
            CenterArc((19.364916731, 20), ZAOKR_GLENIE1_R, 194.477512186, 75.522487814)
            Line((0, 15), (-0.387298335, 14.9))
            ThreePointArc((-0.387298335, 14.9), (-0.4, 7.5), (-0.4, 0))
            Line((-0.4, 0), (0, -0.4))
            Line((0, -0.4), (19.364916731, -0.4))
            Line((19.364916731, -0.4), (19.364916731, 0))
        make_face()
    extrude(amount=126.824583655, mode=Mode.SUBTRACT)
    with BuildSketch(Plane(origin=(-100, -50, -100), x_dir=(0, 0, 1), z_dir=(0, 1, 0)), Plane(origin=(100, -50, -100), x_dir=(-1, 0, 0), z_dir=(0, 1, 0))) as zaokr_glenie1_piece_2:
        with BuildLine():
            CenterArc((ZAOKR_GLENIE1_R, ZAOKR_GLENIE1_R), ZAOKR_GLENIE1_R, 180, 90)
            Line((0, ZAOKR_GLENIE1_R), (-ZAOKR_GLENIE1_R * 0.02, ZAOKR_GLENIE1_R))
            Line((-ZAOKR_GLENIE1_R * 0.02, ZAOKR_GLENIE1_R), (-ZAOKR_GLENIE1_R * 0.02, -ZAOKR_GLENIE1_R * 0.02))
            Line((-ZAOKR_GLENIE1_R * 0.02, -ZAOKR_GLENIE1_R * 0.02), (ZAOKR_GLENIE1_R, -ZAOKR_GLENIE1_R * 0.02))
            Line((ZAOKR_GLENIE1_R, -ZAOKR_GLENIE1_R * 0.02), (ZAOKR_GLENIE1_R, 0))
        make_face()
    extrude(amount=130, mode=Mode.SUBTRACT)
    with BuildSketch(Plane(origin=(100, -48.412291828, 100), x_dir=(-1, 0, 0), z_dir=(0, 1, 0))) as zaokr_glenie1_piece_3:
        with BuildLine():
            CenterArc((19.364916731, -20), ZAOKR_GLENIE1_R, 90, 75.522487814)
            Line((0, -15), (-0.387298335, -14.9))
            ThreePointArc((-0.387298335, -14.9), (-0.4, -7.5), (-0.4, 0))
            Line((-0.4, 0), (0, 0.4))
            Line((0, 0.4), (19.364916731, 0.4))
            Line((19.364916731, 0.4), (19.364916731, 0))
        make_face()
    extrude(amount=126.824583655, mode=Mode.SUBTRACT)

    # Sfazowanie1
    sfazowanie1_edges = [part_1.edges().sort_by_distance(p)[0] for p in [
        (-45, 70, 0),
    ]]
    chamfer(sfazowanie1_edges, length=SFAZOWANIE1_SIZE)

    # Szkic10 → Wytnij-wyciągnięcie5 (cut, through all)
    with BuildSketch(Plane(origin=(0, 9, 0), x_dir=(1, 0, 0), z_dir=(0, 1, 0))):
        with Locations(Location((-35, 0, 0), (0, 0, 270))):
            Circle(SZKIC10_R)
        with Locations(Location((-20, 0, 0), (0, 0, 270))):
            Circle(SZKIC10_R)
    extrude(amount=-WYTNIJ_WYCI_GNI_CIE5_DEPTH, mode=Mode.SUBTRACT)

    # Szkic11 → Wytnij-wyciągnięcie6 (cut, two sides: drawn at the far end of the back side and taken through both)
    with BuildSketch(Plane(origin=(0, 0, 0), x_dir=(-1, 0, 0), z_dir=(0, -1, 0)).offset(-WYTNIJ_WYCI_GNI_CIE6_DEPTH_BACK)):
        with Locations(Location((20, 0, 0), (0, 0, 270))):
            Circle(SZKIC11_R)
        with Locations(Location((35, 0, 0), (0, 0, 270))):
            Circle(SZKIC11_R)
    extrude(amount=WYTNIJ_WYCI_GNI_CIE6_DEPTH + WYTNIJ_WYCI_GNI_CIE6_DEPTH_BACK, mode=Mode.SUBTRACT)


solid = part_1.part
